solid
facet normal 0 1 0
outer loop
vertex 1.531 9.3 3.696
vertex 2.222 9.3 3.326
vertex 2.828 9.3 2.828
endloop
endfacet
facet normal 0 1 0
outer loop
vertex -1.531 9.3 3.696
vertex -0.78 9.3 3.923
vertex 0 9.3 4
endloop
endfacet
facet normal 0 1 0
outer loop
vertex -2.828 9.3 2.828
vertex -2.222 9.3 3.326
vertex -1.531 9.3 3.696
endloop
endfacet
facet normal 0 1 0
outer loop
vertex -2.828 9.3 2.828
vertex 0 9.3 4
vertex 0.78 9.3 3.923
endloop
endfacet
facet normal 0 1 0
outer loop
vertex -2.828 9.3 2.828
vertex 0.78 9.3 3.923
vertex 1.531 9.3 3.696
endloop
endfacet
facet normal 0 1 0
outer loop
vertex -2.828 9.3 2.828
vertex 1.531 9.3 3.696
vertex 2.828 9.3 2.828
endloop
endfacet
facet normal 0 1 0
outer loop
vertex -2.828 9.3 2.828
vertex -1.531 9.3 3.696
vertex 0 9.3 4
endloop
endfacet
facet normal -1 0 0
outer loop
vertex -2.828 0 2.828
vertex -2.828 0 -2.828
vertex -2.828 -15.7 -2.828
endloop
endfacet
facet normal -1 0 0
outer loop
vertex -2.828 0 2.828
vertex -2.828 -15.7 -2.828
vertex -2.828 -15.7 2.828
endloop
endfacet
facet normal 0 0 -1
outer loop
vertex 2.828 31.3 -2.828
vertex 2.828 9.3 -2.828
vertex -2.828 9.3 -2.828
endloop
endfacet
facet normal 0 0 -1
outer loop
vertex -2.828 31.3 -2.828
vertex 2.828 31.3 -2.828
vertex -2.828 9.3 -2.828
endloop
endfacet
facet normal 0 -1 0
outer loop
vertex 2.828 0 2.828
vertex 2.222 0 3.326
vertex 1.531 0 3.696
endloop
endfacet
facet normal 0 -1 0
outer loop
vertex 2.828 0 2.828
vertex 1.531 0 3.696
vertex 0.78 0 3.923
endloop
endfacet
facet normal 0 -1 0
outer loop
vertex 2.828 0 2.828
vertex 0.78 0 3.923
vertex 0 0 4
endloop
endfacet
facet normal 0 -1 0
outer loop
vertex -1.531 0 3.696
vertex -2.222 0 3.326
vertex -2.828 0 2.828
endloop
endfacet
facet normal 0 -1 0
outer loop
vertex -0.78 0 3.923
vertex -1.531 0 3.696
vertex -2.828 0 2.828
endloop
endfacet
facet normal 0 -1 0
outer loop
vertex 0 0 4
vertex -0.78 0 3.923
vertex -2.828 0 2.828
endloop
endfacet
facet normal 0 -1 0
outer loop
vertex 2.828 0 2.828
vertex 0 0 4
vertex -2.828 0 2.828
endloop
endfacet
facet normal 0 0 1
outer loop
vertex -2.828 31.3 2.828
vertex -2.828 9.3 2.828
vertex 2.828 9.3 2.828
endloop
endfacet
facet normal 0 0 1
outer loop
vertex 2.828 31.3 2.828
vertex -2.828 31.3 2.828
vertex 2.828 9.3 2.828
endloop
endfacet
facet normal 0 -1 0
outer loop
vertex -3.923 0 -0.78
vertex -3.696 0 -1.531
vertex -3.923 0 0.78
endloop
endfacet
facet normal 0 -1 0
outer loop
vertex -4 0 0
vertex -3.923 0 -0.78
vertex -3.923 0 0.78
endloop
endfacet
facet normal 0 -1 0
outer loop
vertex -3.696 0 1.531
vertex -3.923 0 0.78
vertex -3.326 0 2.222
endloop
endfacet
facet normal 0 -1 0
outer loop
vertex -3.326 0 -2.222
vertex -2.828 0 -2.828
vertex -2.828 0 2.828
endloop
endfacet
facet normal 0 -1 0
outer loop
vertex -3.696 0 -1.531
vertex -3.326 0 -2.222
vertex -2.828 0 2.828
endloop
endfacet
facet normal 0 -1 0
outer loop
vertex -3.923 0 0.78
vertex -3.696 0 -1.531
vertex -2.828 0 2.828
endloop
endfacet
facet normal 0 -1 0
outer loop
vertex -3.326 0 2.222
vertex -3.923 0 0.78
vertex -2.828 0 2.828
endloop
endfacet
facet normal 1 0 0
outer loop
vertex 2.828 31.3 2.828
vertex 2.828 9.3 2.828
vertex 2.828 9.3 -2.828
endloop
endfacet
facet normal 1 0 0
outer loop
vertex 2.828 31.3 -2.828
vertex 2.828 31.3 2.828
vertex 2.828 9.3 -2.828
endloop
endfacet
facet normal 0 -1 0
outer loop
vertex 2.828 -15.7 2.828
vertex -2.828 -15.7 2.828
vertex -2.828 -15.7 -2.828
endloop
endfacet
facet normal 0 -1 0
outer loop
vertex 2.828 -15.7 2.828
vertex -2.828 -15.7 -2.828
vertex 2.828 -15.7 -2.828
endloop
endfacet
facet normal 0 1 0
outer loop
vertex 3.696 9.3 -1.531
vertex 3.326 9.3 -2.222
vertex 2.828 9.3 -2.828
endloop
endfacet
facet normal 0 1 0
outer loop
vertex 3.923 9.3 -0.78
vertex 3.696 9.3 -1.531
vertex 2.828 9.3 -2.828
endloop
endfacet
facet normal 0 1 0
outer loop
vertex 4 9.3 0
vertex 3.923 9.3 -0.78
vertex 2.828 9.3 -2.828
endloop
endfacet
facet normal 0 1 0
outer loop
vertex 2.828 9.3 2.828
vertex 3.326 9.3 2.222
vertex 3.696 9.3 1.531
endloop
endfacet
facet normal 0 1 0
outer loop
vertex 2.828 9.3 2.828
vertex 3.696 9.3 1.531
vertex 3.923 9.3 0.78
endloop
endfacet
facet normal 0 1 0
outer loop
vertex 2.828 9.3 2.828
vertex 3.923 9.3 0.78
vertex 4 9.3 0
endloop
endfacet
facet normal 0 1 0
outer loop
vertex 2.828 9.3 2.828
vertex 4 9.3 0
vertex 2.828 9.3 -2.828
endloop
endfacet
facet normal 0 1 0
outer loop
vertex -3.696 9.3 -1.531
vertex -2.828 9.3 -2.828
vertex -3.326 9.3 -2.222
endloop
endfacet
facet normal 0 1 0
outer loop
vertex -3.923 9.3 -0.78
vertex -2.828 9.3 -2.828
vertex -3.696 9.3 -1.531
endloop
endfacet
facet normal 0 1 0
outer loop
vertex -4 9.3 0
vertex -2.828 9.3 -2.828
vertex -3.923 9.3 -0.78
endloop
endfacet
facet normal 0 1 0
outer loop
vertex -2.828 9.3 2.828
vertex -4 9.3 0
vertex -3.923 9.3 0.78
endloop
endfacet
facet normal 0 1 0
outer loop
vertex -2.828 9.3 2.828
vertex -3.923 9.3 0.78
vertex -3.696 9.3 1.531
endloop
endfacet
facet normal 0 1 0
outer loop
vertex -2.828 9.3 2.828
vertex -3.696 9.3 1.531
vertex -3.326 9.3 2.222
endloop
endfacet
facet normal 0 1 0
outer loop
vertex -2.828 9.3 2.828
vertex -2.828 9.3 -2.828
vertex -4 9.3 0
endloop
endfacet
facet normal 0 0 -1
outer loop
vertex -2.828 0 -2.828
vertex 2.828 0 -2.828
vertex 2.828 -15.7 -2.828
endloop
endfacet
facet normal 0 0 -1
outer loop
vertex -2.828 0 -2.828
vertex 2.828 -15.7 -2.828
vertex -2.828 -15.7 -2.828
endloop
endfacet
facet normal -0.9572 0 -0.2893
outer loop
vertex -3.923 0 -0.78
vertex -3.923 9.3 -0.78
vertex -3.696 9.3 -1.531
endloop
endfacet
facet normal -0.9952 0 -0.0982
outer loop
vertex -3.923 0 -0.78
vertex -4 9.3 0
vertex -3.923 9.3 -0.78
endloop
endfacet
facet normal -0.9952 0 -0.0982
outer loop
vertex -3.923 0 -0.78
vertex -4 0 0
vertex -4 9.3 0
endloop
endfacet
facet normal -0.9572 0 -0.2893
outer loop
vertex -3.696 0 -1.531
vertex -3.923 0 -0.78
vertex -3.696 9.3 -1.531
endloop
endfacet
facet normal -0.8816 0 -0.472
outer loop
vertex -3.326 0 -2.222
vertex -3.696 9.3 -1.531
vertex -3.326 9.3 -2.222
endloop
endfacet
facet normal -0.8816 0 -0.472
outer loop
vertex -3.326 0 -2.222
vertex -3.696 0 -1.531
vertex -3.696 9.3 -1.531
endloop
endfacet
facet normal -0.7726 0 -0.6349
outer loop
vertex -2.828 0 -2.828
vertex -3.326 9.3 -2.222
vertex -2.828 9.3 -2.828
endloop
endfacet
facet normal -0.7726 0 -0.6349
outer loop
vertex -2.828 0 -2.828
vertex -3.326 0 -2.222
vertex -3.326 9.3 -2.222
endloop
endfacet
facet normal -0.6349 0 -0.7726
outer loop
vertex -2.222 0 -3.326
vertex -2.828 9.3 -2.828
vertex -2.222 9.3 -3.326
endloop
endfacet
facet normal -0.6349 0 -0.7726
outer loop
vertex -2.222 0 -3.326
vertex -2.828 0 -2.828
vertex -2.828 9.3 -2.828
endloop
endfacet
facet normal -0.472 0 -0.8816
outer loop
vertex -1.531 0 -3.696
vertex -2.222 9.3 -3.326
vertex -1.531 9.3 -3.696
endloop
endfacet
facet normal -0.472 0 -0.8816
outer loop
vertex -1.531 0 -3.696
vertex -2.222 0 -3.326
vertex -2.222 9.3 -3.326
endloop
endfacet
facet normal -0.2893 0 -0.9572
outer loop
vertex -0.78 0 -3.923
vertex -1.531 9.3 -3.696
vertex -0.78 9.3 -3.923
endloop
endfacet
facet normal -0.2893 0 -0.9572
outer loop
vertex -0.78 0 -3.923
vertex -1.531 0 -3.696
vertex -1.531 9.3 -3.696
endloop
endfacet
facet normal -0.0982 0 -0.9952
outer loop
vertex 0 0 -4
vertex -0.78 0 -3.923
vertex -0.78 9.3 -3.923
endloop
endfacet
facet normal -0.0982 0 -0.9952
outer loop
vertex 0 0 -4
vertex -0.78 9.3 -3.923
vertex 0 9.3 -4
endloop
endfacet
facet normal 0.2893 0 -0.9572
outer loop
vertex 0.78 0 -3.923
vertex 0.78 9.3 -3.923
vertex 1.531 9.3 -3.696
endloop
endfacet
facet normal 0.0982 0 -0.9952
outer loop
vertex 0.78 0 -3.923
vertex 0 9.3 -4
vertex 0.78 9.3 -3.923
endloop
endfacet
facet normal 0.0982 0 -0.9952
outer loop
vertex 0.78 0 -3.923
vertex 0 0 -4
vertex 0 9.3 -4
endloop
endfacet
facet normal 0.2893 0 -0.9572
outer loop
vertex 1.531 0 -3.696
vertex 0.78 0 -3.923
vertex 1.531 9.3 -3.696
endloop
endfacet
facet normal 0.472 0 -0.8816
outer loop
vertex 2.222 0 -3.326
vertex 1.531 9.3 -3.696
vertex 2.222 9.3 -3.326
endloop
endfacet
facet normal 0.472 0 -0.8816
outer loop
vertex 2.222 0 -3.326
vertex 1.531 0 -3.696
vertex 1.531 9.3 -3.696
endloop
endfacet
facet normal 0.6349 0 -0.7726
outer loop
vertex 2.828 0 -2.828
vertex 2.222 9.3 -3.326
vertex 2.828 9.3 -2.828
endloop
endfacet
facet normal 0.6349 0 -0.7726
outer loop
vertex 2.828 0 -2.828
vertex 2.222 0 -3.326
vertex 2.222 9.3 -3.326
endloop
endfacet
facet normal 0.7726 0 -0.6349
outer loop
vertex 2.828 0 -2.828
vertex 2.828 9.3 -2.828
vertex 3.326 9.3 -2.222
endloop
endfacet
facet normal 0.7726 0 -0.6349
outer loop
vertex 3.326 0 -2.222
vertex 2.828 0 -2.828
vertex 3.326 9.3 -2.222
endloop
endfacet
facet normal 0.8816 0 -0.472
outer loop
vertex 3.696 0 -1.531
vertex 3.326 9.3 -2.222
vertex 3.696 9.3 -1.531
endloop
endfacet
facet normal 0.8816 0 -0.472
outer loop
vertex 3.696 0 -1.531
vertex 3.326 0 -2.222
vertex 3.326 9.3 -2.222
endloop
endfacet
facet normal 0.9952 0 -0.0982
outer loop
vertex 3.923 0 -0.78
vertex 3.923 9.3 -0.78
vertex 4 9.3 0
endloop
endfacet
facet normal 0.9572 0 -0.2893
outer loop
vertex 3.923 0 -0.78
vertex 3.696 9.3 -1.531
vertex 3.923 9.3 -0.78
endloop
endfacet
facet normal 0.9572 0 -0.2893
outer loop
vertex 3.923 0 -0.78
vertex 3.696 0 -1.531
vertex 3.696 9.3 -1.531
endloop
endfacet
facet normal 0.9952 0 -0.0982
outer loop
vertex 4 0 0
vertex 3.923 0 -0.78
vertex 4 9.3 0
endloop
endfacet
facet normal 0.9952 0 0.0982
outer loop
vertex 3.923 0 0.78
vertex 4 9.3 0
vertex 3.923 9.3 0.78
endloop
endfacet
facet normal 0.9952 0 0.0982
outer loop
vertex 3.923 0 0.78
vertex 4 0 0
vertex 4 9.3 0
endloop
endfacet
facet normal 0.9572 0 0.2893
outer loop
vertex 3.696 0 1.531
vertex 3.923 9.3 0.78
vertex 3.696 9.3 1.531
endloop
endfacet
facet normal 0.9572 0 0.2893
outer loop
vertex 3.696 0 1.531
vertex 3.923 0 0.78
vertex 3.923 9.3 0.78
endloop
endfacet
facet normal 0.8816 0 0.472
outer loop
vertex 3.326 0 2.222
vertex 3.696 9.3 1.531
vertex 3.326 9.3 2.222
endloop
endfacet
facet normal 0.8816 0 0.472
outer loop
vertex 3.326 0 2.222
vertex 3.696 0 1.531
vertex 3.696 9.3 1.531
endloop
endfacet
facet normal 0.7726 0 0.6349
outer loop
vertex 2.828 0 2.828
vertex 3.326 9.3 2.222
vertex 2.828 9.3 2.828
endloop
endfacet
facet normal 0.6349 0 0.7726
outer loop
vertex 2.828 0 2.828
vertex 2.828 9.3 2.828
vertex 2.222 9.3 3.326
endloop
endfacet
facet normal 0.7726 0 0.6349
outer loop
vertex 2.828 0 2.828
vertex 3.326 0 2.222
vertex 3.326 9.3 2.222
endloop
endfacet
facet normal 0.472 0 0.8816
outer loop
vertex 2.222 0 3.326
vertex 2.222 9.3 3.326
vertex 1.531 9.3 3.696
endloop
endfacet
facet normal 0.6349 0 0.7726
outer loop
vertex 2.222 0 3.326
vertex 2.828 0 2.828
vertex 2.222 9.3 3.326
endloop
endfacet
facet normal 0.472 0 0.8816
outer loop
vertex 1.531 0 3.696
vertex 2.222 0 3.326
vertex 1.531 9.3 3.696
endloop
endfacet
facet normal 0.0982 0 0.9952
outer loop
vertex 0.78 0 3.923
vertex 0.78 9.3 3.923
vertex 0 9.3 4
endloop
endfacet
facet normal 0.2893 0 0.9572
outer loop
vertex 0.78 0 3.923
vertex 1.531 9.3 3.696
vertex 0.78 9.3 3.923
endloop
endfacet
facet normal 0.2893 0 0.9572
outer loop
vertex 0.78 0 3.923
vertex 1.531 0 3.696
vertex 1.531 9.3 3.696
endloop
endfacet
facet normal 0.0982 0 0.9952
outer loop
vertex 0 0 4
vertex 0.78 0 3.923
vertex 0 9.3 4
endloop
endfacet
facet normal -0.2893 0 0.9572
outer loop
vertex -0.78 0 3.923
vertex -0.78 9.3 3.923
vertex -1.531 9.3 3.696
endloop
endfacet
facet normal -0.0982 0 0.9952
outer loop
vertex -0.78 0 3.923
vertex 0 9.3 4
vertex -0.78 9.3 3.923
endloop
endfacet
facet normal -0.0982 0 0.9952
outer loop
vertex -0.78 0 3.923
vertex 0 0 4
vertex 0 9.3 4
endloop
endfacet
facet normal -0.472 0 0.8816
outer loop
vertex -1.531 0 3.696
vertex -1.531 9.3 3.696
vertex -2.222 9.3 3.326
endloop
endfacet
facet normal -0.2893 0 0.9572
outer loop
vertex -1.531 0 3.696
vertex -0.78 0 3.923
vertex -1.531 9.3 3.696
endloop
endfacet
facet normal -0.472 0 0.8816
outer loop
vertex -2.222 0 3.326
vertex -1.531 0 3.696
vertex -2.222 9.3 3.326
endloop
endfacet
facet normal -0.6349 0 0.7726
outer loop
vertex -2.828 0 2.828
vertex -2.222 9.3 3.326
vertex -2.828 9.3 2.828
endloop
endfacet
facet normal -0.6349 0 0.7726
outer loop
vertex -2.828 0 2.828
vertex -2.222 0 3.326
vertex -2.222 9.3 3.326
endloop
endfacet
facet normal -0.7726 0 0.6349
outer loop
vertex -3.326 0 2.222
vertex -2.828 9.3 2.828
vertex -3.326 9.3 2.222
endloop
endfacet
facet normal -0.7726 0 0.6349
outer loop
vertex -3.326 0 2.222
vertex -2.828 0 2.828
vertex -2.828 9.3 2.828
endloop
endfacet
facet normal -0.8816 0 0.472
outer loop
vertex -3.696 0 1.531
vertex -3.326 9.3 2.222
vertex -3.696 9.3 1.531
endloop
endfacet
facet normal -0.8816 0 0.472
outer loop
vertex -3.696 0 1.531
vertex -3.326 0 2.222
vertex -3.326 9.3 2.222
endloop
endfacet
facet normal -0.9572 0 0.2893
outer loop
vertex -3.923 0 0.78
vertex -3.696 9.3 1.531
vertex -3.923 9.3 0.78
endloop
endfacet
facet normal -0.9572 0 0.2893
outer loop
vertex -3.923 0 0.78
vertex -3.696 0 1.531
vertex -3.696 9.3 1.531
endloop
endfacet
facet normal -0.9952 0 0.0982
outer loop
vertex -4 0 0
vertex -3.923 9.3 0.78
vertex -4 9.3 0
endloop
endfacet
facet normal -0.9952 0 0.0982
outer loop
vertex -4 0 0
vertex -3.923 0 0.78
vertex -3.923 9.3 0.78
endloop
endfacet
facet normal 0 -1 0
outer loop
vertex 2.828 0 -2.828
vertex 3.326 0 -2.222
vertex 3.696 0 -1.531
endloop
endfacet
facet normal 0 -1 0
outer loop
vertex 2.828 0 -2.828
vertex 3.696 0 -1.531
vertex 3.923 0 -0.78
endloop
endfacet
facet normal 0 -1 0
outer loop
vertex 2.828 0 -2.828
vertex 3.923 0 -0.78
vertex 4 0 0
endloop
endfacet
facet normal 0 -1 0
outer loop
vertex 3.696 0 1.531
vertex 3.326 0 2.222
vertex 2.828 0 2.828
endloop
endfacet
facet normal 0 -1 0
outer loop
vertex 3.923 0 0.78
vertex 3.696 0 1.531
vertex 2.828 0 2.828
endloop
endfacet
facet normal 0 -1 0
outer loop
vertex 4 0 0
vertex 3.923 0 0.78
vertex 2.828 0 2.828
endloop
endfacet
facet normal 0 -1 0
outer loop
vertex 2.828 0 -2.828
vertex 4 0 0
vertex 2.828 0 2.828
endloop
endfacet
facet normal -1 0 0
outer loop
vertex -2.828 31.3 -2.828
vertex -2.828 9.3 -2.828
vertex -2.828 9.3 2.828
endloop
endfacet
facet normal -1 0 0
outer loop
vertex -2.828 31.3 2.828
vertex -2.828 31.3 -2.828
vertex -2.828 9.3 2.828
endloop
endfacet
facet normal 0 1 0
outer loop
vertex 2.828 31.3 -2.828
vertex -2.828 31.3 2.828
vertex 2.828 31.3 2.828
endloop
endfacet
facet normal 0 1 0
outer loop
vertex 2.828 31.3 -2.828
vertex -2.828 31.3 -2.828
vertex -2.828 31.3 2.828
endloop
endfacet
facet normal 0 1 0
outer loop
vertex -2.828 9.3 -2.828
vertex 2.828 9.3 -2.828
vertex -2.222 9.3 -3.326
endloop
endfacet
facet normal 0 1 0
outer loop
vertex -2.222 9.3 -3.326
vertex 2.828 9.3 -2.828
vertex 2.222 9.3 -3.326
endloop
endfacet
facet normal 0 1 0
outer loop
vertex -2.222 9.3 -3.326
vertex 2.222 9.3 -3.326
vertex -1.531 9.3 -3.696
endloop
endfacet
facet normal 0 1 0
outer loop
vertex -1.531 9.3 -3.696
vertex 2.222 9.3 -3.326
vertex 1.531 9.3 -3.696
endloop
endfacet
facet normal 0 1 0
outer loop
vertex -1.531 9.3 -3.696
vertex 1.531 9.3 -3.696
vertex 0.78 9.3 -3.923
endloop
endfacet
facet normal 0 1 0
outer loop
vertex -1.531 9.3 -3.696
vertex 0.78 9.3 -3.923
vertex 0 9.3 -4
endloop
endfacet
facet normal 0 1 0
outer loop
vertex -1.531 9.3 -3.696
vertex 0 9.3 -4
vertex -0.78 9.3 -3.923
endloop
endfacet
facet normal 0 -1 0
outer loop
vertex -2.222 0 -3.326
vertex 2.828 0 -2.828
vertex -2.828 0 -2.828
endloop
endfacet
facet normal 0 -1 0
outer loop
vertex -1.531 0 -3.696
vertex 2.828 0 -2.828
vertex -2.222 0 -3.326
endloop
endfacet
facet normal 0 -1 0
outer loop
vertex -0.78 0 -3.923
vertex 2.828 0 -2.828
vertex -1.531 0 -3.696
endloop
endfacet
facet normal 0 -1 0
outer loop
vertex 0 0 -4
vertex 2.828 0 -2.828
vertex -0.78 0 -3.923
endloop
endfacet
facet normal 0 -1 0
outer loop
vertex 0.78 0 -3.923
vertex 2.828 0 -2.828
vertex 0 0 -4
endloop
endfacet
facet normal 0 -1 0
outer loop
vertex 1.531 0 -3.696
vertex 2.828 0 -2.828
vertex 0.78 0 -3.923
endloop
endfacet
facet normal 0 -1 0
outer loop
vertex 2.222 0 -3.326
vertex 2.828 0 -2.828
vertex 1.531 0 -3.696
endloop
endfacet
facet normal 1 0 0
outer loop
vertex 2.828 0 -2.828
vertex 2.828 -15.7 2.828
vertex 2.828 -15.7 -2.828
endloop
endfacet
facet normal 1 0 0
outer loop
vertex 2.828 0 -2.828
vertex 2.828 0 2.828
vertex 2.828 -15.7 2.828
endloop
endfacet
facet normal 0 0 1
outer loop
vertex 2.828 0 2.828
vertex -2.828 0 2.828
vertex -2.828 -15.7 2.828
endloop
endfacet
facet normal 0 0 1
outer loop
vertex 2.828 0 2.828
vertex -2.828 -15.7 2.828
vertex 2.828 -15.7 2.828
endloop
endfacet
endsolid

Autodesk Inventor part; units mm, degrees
ref_plane "YZ Plane" through (0, 0, 0) normal (1, 0, 0) x (0, 1, 0)
ref_plane "XZ Plane" through (0, 0, 0) normal (0, 1, 0) x (-1, 0, 0)
ref_plane "XY Plane" through (0, 0, 0) normal (0, 0, 1) x (1, 0, 0)
sketch "Sketch1" plane through (0, 0, 0) normal (0, 1, 0) x (-1, 0, 0)
  circle A0 centre (0, 0) radius 4
  dimension "d0" = 8
extrude "Extrusion1" add sketch "Sketch1" along normal blind 9.3
sketch "Sketch2" plane through (0, 9.3, 0) normal (0, 1, 0) x (1, 0, 0)
  line L0 (2.8284, 2.8284) -> (-2.8284, 2.8284)
  line L1 (-2.8284, 2.8284) -> (-2.8284, -2.8284)
  line L2 (-2.8284, -2.8284) -> (2.8284, -2.8284)
  line L3 (2.8284, -2.8284) -> (2.8284, 2.8284)
  line L4 (2.8284, 2.8284) -> (-2.8284, -2.8284) construction
  line L5 (-2.8284, 2.8284) -> (2.8284, -2.8284) construction
  circle A0 centre (0, 0) radius 4 projected
extrude "Extrusion2" add sketch "Sketch2" along normal blind 22 contours L3 L2 L1 L0
sketch "Sketch3" plane through (0, 0, 0) normal (0, -1, 0) x (1, 0, 0)
  line L0 (2.8284, -2.8284) -> (-2.8284, -2.8284)
  line L1 (-2.8284, -2.8284) -> (-2.8284, 2.8284)
  line L2 (-2.8284, 2.8284) -> (2.8284, 2.8284)
  line L3 (2.8284, 2.8284) -> (2.8284, -2.8284)
  line L4 (2.8284, -2.8284) -> (-2.8284, 2.8284) construction
  line L5 (-2.8284, -2.8284) -> (2.8284, 2.8284) construction
  circle A0 centre (0, 0) radius 4 projected
extrude "Extrusion3" add sketch "Sketch3" along normal blind 15.7 contours L0 L1 L2 L3
properties part number "SCARA swivel connection rod"
